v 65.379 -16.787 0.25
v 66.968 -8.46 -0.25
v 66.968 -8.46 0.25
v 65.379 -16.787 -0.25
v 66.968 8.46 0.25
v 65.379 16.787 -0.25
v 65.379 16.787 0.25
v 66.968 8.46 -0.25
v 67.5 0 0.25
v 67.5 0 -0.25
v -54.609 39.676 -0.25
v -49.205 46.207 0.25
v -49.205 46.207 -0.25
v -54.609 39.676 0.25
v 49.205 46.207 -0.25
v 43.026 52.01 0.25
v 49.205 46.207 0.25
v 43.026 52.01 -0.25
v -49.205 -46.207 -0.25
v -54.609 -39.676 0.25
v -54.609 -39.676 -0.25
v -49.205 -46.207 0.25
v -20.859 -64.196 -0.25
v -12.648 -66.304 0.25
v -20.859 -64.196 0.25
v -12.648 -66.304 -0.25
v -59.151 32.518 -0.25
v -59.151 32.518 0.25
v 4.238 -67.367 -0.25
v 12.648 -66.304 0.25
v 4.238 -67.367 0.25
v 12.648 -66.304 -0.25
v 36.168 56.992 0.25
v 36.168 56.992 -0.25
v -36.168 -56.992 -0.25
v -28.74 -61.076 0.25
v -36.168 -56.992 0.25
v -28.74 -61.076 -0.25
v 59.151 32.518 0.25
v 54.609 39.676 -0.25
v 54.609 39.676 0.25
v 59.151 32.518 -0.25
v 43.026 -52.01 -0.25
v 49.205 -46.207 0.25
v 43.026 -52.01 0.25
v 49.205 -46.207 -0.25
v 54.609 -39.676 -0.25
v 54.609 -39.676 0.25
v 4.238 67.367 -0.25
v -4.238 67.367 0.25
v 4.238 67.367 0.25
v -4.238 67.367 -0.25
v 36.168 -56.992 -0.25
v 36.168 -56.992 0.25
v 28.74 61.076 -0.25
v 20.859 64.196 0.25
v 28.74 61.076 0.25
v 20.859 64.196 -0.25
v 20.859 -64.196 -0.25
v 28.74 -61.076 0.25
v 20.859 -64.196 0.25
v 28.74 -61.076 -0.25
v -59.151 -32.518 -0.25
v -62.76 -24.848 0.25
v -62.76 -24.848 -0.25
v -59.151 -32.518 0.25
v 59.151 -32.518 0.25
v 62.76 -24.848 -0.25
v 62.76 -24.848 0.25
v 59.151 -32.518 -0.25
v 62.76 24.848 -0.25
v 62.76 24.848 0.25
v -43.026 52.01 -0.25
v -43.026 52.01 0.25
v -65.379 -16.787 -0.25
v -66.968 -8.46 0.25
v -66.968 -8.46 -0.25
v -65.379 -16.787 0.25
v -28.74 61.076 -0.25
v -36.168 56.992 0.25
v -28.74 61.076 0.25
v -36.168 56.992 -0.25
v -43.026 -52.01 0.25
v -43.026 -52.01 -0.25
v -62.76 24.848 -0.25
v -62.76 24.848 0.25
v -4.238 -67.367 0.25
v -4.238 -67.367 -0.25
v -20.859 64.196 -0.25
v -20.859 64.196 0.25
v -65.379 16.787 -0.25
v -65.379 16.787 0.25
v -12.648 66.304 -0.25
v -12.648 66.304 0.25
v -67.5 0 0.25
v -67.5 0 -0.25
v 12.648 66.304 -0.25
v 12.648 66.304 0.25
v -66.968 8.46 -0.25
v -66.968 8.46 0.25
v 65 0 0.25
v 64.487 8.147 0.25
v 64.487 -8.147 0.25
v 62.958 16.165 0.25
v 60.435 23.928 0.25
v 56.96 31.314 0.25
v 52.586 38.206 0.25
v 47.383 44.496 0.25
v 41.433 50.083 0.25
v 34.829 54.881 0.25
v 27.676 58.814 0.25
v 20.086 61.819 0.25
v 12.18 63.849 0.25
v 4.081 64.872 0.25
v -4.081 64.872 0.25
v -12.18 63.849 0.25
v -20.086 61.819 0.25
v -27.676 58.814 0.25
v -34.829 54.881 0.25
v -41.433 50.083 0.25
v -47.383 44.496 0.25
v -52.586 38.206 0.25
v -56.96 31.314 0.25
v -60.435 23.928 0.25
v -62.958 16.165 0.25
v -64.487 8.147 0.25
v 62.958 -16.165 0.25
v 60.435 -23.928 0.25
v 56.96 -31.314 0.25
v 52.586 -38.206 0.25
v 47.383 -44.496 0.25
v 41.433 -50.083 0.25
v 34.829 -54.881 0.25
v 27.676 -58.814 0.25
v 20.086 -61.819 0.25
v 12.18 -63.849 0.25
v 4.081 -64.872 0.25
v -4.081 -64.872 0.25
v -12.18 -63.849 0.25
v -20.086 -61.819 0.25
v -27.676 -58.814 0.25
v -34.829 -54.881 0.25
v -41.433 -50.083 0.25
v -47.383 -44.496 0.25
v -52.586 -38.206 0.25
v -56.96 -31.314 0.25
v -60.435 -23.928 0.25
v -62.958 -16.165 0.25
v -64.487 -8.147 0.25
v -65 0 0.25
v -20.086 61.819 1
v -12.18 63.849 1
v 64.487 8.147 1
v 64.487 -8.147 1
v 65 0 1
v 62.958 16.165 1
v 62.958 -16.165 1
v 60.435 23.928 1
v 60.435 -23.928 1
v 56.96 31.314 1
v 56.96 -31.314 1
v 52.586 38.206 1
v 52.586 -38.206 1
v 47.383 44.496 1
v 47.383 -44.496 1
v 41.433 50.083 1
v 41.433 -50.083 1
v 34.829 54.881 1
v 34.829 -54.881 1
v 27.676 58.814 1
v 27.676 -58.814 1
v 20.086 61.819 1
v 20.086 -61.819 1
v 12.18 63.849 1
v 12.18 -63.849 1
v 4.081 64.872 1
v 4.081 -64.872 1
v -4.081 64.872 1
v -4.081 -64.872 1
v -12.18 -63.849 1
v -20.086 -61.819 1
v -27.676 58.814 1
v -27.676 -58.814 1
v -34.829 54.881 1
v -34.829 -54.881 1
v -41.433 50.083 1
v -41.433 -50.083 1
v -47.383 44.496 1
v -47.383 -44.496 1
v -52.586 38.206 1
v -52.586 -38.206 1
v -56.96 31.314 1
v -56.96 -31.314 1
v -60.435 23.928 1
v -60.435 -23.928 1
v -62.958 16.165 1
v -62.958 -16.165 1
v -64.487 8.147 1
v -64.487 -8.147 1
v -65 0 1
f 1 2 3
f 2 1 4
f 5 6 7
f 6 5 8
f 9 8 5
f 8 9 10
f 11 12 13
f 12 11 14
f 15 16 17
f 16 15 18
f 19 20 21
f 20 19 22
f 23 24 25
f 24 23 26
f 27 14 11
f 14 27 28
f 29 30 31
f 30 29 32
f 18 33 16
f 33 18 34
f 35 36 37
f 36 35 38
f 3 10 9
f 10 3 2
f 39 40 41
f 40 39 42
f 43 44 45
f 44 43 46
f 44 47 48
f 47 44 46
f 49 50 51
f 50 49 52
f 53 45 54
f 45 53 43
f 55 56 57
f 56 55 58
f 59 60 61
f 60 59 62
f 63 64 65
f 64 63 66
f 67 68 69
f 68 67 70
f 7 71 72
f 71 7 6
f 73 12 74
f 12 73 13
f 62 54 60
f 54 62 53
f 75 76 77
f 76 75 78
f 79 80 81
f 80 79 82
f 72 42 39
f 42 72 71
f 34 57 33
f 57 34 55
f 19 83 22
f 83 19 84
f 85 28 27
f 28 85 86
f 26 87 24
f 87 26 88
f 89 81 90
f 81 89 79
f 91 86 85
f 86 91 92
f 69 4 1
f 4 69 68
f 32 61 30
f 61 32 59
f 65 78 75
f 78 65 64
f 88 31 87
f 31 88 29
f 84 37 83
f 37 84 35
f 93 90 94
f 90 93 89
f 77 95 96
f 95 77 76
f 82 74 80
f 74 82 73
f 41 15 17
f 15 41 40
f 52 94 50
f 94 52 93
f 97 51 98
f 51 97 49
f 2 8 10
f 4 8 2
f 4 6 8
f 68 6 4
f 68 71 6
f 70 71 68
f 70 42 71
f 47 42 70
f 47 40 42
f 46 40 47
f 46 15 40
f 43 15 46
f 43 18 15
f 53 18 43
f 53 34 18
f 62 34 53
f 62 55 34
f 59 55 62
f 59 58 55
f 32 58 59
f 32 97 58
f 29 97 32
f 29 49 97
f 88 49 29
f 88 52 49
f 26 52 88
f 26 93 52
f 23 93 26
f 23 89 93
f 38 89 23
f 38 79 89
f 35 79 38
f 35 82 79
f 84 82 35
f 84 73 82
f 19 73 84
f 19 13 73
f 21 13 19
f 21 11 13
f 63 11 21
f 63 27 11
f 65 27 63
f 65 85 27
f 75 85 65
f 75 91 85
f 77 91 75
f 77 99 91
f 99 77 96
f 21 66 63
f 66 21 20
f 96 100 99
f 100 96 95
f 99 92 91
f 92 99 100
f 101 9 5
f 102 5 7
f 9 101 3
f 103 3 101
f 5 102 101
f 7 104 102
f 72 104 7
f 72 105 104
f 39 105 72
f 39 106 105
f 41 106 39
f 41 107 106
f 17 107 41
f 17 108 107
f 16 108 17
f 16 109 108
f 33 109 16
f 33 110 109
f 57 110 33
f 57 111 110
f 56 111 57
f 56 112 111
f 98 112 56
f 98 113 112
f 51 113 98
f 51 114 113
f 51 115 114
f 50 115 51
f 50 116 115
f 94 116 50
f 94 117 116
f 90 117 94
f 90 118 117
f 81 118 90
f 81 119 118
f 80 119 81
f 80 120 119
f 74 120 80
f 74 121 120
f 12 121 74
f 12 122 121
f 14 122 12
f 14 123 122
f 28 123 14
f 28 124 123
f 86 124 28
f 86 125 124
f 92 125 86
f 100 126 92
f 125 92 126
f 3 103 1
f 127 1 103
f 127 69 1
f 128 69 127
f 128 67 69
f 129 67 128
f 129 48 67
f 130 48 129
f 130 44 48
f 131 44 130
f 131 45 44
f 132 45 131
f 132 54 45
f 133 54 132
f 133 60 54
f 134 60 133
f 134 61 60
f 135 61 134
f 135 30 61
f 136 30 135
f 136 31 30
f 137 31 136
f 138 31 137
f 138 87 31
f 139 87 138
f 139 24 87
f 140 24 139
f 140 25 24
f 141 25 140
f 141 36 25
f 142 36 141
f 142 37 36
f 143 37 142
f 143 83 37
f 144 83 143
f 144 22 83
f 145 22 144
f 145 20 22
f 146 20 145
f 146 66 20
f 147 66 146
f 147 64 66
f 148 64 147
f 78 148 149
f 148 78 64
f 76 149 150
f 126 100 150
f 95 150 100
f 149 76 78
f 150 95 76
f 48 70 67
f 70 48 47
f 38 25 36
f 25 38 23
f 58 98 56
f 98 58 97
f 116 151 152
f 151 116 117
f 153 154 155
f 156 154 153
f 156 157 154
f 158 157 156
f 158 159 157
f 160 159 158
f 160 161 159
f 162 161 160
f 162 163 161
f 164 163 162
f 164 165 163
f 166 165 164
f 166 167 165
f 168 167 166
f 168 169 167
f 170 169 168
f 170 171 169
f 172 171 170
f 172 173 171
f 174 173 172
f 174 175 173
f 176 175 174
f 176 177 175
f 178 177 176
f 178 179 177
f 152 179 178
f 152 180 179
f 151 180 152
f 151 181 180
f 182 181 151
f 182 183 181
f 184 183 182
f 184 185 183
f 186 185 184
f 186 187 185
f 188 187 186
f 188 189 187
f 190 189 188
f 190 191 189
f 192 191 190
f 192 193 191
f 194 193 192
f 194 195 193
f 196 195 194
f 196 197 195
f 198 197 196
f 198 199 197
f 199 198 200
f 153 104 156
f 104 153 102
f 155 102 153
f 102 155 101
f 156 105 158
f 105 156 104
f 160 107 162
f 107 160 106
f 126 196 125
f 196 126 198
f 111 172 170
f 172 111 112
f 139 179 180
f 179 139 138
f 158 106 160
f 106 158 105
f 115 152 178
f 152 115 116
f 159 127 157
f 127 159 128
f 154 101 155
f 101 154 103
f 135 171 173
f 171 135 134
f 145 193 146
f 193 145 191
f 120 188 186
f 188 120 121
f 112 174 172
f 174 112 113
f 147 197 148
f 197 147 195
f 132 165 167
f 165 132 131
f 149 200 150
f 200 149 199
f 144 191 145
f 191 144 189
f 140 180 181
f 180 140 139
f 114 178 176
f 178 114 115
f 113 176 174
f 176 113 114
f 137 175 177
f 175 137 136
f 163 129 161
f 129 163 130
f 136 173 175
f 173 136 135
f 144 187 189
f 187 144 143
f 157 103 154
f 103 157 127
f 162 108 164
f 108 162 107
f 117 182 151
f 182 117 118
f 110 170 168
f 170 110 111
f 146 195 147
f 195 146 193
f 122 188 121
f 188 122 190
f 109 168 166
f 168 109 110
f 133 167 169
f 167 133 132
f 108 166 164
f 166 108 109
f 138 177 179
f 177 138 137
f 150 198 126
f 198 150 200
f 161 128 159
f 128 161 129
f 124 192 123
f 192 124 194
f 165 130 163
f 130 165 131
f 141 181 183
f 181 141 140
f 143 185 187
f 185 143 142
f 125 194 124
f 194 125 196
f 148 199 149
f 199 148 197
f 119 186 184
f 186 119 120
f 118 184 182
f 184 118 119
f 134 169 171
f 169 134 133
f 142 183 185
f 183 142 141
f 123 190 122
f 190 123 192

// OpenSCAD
//Parametric Light Lens for a recessed overhead light

// Large diameter
d=135; 
// lip width
l=5;
//height
h=1;

$fn=50;

union(){
cylinder(r=d/2, h=h/2, center=true);
translate([0,0,h/2])cylinder(r=(d-l)/2, h=h, center=true);
}
